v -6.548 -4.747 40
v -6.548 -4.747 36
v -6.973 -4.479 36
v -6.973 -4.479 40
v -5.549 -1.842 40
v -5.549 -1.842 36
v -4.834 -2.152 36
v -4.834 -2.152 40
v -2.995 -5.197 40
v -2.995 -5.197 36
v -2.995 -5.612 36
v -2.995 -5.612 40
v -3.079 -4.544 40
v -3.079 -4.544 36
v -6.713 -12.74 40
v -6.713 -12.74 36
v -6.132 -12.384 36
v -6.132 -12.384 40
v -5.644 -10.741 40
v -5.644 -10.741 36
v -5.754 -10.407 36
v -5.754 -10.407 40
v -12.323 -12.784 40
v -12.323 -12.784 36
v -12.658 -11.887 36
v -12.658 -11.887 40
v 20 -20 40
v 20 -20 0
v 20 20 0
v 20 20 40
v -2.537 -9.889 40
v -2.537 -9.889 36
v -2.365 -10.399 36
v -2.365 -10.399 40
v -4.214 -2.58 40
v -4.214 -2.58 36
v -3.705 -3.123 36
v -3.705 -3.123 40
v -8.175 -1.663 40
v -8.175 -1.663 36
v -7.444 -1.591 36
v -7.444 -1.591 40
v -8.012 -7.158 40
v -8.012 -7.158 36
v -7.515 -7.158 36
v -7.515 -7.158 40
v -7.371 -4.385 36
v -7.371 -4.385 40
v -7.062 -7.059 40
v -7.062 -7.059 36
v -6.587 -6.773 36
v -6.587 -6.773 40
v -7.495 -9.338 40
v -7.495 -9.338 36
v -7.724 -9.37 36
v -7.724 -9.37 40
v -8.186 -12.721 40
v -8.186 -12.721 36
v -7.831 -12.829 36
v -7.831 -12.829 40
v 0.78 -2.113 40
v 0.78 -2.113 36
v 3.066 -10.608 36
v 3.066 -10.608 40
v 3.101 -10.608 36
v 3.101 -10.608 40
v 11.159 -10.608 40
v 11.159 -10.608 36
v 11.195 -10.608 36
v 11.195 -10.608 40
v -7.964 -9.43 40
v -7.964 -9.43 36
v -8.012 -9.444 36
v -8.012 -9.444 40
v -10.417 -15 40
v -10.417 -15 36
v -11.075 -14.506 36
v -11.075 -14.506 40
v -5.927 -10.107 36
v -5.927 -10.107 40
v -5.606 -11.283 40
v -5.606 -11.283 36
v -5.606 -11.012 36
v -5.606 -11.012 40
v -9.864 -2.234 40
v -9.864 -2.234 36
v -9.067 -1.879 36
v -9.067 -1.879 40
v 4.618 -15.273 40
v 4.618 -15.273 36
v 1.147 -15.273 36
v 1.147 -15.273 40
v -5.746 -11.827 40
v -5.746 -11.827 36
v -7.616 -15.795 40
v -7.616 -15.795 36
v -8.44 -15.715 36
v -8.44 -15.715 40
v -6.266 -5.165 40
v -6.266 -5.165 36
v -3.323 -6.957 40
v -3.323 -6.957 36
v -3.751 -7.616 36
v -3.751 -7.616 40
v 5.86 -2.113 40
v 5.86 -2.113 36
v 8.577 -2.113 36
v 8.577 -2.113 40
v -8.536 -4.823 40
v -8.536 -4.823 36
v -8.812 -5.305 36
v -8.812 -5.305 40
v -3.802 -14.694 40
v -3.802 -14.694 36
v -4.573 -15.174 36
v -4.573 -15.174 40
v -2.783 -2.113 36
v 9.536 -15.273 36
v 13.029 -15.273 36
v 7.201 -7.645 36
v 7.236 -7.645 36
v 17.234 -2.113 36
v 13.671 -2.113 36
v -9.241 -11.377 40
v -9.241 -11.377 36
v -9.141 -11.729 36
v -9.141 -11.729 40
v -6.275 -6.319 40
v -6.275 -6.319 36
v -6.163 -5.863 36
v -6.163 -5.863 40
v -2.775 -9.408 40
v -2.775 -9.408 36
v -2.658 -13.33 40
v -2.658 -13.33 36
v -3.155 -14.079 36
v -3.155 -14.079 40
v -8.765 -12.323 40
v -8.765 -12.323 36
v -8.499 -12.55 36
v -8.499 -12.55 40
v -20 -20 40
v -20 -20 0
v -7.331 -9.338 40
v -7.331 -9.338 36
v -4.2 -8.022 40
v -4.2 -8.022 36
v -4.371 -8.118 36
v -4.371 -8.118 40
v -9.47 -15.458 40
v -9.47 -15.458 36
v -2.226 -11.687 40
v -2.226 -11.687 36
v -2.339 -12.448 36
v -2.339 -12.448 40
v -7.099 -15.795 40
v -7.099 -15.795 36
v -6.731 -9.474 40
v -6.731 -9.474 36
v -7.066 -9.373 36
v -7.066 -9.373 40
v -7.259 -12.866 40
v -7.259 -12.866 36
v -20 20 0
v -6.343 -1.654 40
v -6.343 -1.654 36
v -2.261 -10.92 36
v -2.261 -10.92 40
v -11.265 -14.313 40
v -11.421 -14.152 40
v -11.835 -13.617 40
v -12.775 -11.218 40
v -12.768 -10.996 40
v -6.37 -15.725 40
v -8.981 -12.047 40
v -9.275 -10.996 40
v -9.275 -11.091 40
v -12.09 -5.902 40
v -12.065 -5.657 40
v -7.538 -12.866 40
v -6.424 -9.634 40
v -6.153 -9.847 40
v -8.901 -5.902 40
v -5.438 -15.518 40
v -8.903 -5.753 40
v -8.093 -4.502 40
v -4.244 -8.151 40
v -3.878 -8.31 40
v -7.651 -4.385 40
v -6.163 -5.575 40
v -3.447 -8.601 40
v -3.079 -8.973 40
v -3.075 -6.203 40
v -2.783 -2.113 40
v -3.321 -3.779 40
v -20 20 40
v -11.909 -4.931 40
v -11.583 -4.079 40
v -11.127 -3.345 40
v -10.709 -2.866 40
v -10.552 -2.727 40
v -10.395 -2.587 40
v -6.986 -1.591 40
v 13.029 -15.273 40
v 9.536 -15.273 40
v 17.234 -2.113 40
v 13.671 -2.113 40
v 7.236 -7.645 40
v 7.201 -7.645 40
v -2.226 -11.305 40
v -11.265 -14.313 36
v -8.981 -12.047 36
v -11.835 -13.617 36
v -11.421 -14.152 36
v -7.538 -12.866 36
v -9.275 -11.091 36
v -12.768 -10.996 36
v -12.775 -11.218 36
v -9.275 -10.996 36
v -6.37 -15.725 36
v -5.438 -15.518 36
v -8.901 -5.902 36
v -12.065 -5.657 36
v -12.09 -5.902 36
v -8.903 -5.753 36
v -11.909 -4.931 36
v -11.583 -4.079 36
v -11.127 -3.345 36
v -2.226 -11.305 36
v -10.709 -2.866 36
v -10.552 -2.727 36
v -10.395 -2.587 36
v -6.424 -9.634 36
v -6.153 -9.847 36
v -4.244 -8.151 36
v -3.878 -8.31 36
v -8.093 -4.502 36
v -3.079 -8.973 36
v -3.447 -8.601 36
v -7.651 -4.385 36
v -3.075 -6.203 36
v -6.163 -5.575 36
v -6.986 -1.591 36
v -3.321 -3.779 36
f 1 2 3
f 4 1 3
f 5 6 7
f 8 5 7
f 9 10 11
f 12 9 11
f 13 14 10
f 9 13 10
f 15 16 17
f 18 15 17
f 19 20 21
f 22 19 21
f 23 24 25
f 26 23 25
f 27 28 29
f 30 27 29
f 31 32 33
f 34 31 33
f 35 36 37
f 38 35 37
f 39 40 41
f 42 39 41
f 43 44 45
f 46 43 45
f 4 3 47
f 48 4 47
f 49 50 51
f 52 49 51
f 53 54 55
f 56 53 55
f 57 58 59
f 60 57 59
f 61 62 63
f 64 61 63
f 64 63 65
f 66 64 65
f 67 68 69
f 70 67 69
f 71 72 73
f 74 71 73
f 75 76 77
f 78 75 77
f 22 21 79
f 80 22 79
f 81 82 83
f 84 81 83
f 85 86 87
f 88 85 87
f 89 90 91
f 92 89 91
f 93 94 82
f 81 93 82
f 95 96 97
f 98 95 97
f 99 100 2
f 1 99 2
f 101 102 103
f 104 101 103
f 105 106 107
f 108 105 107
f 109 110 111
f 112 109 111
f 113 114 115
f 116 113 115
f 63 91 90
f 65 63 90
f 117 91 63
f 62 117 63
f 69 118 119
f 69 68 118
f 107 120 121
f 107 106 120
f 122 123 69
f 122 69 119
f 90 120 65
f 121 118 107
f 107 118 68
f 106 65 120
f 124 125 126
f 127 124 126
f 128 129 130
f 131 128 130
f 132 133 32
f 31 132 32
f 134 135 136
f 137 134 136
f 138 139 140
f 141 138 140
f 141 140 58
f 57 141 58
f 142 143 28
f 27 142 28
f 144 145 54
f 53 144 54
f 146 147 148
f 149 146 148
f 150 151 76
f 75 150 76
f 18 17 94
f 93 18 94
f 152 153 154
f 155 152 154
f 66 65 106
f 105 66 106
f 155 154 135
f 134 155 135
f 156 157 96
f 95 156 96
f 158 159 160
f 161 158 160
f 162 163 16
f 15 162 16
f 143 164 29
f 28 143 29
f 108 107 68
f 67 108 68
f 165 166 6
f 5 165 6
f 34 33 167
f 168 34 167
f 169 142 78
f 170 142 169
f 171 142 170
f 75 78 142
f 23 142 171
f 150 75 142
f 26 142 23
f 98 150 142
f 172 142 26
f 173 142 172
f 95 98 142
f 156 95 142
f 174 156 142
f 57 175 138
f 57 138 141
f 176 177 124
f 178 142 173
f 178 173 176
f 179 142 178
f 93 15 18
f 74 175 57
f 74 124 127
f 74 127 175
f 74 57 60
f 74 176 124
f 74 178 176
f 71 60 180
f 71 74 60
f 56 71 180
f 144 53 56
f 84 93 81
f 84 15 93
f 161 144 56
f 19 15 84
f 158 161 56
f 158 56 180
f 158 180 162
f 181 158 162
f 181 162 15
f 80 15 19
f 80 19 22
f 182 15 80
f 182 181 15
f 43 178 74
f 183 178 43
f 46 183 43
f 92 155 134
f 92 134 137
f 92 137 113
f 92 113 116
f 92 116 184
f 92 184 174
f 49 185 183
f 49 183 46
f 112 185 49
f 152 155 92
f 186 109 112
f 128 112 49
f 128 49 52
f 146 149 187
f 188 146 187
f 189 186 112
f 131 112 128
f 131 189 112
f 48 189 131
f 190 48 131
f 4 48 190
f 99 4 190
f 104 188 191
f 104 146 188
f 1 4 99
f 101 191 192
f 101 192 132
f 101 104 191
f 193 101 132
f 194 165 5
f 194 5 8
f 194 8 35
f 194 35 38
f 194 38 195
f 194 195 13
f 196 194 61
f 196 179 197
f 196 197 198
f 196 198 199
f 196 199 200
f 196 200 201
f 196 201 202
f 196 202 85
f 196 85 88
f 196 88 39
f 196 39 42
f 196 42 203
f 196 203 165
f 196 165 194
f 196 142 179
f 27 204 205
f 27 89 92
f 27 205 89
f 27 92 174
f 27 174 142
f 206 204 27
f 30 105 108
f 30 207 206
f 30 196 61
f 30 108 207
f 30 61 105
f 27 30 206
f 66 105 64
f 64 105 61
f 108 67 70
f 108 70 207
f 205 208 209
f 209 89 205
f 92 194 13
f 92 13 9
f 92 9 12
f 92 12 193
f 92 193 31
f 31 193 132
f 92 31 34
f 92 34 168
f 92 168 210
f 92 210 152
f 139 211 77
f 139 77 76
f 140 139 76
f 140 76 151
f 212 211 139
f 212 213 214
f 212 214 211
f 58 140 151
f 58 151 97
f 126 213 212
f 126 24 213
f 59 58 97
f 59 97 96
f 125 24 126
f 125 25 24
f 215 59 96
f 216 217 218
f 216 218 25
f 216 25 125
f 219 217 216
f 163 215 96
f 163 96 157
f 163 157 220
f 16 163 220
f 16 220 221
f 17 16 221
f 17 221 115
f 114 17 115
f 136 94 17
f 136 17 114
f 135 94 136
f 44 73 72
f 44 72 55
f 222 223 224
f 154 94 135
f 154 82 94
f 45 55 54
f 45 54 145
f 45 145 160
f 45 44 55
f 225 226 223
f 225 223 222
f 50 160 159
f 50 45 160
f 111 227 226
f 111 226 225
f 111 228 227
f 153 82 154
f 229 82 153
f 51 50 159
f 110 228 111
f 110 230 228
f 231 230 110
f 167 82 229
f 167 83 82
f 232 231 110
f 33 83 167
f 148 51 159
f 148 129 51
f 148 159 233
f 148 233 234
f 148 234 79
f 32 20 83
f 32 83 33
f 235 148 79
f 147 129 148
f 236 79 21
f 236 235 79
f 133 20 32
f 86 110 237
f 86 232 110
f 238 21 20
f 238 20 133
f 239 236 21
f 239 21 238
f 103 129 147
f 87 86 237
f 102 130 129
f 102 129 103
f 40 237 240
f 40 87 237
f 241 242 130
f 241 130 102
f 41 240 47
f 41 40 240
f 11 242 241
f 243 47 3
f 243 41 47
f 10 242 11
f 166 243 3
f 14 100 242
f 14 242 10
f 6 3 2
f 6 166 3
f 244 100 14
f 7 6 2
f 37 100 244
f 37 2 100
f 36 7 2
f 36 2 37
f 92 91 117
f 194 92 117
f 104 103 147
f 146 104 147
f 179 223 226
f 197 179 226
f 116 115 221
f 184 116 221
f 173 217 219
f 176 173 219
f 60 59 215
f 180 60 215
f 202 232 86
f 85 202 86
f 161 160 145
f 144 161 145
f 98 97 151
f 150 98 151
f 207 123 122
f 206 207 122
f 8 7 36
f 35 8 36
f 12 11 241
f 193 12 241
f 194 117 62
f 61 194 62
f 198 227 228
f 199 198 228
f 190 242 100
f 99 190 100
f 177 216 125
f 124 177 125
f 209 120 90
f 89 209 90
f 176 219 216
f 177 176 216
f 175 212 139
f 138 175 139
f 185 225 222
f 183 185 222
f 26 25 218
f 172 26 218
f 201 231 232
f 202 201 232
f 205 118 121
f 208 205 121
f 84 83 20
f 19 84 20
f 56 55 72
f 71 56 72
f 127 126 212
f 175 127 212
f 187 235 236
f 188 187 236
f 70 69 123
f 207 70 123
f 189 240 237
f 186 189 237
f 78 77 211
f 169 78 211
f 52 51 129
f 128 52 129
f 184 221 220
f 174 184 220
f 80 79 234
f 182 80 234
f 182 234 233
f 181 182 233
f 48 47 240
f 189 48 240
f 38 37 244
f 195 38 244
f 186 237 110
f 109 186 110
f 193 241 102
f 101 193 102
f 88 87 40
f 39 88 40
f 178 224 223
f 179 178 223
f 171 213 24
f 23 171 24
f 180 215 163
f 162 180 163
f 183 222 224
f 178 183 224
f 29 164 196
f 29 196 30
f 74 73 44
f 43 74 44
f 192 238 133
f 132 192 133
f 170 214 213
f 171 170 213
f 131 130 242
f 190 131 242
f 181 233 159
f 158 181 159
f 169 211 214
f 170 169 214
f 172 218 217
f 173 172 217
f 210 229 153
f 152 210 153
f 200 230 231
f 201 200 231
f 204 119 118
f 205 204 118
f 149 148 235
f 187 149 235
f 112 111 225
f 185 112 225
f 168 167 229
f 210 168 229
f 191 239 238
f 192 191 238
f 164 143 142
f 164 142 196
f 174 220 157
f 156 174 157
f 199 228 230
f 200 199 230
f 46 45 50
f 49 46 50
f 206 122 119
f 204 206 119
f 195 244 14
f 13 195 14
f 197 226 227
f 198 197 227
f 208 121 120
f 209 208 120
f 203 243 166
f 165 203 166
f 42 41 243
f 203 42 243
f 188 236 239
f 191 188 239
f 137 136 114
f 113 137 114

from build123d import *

# Parameters (mm, degrees)
F1_DEPTH = 36
F0_W     = 40
F0_H     = 40
F2_DEPTH = 40


with BuildPart() as f1:
    # F0 (on Top) → F1 (new body)
    with BuildSketch(Plane.XY):
        Polygon((3.101004, -10.608389), (3.065746, -10.608389), (0.779772, -2.113194), (-2.783486, -2.113194), (1.146619, -15.272514), (4.618077, -15.272514), (7.200689, -7.644909), (7.235946, -7.644909), (9.536348, -15.272514), (13.029041, -15.272514), (17.234143, -2.113194), (13.670884, -2.113194), (11.194501, -10.608389), (11.159193, -10.608389), (8.576581, -2.113194), (5.860053, -2.113194), align=None)
        Polygon((-12.065109, -5.657147), (-12.090155, -5.902169), (-8.900907, -5.902169), (-8.903396, -5.753063), (-8.811646, -5.30488), (-8.53599, -4.823371), (-8.093396, -4.501942), (-7.651259, -4.385146), (-7.503778, -4.385146), (-7.371285, -4.385146), (-6.97294, -4.479131), (-6.547974, -4.746761), (-6.265765, -5.164868), (-6.163143, -5.574948), (-6.163143, -5.711709), (-6.163143, -5.863254), (-6.275062, -6.31865), (-6.586788, -6.773437), (-7.062302, -7.058949), (-7.515362, -7.158167), (-7.666144, -7.158167), (-8.012111, -7.158167), (-8.012111, -9.444141), (-7.964408, -9.430119), (-7.723501, -9.370071), (-7.495244, -9.338319), (-7.419192, -9.338319), (-7.330998, -9.338319), (-7.065807, -9.373119), (-6.73122, -9.473962), (-6.423914, -9.634093), (-6.152983, -9.847109), (-5.926707, -10.107067), (-5.754384, -10.406956), (-5.644446, -10.74068), (-5.605887, -11.011916), (-5.605887, -11.102294), (-5.605887, -11.283457), (-5.745849, -11.82725), (-6.131747, -12.383744), (-6.713287, -12.740329), (-7.258807, -12.86632), (-7.440427, -12.86632), (-7.538274, -12.86632), (-7.831253, -12.828523), (-8.185654, -12.720821), (-8.498548, -12.54992), (-8.765314, -12.322781), (-8.981175, -12.046871), (-9.141255, -11.729099), (-9.240828, -11.376578), (-9.274968, -11.091321), (-9.274968, -10.996472), (-12.767661, -10.996472), (-12.77457, -11.21782), (-12.657927, -11.886791), (-12.32334, -12.784172), (-11.834921, -13.61683), (-11.421234, -14.152088), (-11.26466, -14.312778), (-11.075064, -14.506286), (-10.416608, -14.999647), (-9.469847, -15.458285), (-8.43982, -15.714615), (-7.616256, -15.794543), (-7.341768, -15.794543), (-7.098931, -15.794543), (-6.370469, -15.725091), (-5.438289, -15.517825), (-4.572812, -15.173845), (-3.802438, -14.693697), (-3.154753, -14.07878), (-2.657546, -13.329642), (-2.338606, -12.447959), (-2.22623, -11.687441), (-2.22623, -11.43424), (-2.22623, -11.305454), (-2.261233, -10.919658), (-2.365074, -10.39898), (-2.536534, -9.889326), (-2.774951, -9.408122), (-3.078701, -8.972894), (-3.446615, -8.601068), (-3.878033, -8.310273), (-4.244016, -8.151209), (-4.371074, -8.117934), (-4.199614, -8.021967), (-3.751483, -7.615951), (-3.323418, -6.956937), (-3.075399, -6.202566), (-2.995181, -5.612237), (-2.995181, -5.415427), (-2.995181, -5.197382), (-3.079209, -4.543905), (-3.320929, -3.778713), (-3.704643, -3.123001), (-4.214246, -2.579513), (-4.834396, -2.151753), (-5.549344, -1.842212), (-6.343442, -1.654241), (-6.986453, -1.591195), (-7.200638, -1.591195), (-7.444288, -1.591195), (-8.174934, -1.663335), (-9.066879, -1.878637), (-9.863975, -2.233901), (-10.395068, -2.586981), (-10.552252, -2.726993), (-10.709029, -2.866447), (-11.126883, -3.344908), (-11.583295, -4.078907), (-11.908535, -4.930616), align=None)
    extrude(amount=F1_DEPTH)

    # F0 (on Top) → F2 (join)
    with BuildSketch(Plane.XY):
        Rectangle(F0_W, F0_H)
        Polygon((-8.900907, -5.902169), (-12.090155, -5.902169), (-12.065109, -5.657147), (-11.908535, -4.930616), (-11.583295, -4.078907), (-11.126883, -3.344908), (-10.709029, -2.866447), (-10.552252, -2.726993), (-10.395068, -2.586981), (-9.863975, -2.233901), (-9.066879, -1.878637), (-8.174934, -1.663335), (-7.444288, -1.591195), (-7.200638, -1.591195), (-6.986453, -1.591195), (-6.343442, -1.654241), (-5.549344, -1.842212), (-4.834396, -2.151753), (-4.214246, -2.579513), (-3.704643, -3.123001), (-3.320929, -3.778713), (-3.079209, -4.543905), (-2.995181, -5.197382), (-2.995181, -5.415427), (-2.995181, -5.612237), (-3.075399, -6.202566), (-3.323418, -6.956937), (-3.751483, -7.615951), (-4.199614, -8.021967), (-4.371074, -8.117934), (-4.244016, -8.151209), (-3.878033, -8.310273), (-3.446615, -8.601068), (-3.078701, -8.972894), (-2.774951, -9.408122), (-2.536534, -9.889326), (-2.365074, -10.39898), (-2.261233, -10.919658), (-2.22623, -11.305454), (-2.22623, -11.43424), (-2.22623, -11.687441), (-2.338606, -12.447959), (-2.657546, -13.329642), (-3.154753, -14.07878), (-3.802438, -14.693697), (-4.572812, -15.173845), (-5.438289, -15.517825), (-6.370469, -15.725091), (-7.098931, -15.794543), (-7.341768, -15.794543), (-7.616256, -15.794543), (-8.43982, -15.714615), (-9.469847, -15.458285), (-10.416608, -14.999647), (-11.075064, -14.506286), (-11.26466, -14.312778), (-11.421234, -14.152088), (-11.834921, -13.61683), (-12.32334, -12.784172), (-12.657927, -11.886791), (-12.77457, -11.21782), (-12.767661, -10.996472), (-9.274968, -10.996472), (-9.274968, -11.091321), (-9.240828, -11.376578), (-9.141255, -11.729099), (-8.981175, -12.046871), (-8.765314, -12.322781), (-8.498548, -12.54992), (-8.185654, -12.720821), (-7.831253, -12.828523), (-7.538274, -12.86632), (-7.440427, -12.86632), (-7.258807, -12.86632), (-6.713287, -12.740329), (-6.131747, -12.383744), (-5.745849, -11.82725), (-5.605887, -11.283457), (-5.605887, -11.102294), (-5.605887, -11.011916), (-5.644446, -10.74068), (-5.754384, -10.406956), (-5.926707, -10.107067), (-6.152983, -9.847109), (-6.423914, -9.634093), (-6.73122, -9.473962), (-7.065807, -9.373119), (-7.330998, -9.338319), (-7.419192, -9.338319), (-7.495244, -9.338319), (-7.723501, -9.370071), (-7.964408, -9.430119), (-8.012111, -9.444141), (-8.012111, -7.158167), (-7.666144, -7.158167), (-7.515362, -7.158167), (-7.062302, -7.058949), (-6.586788, -6.773437), (-6.275062, -6.31865), (-6.163143, -5.863254), (-6.163143, -5.711709), (-6.163143, -5.574948), (-6.265765, -5.164868), (-6.547974, -4.746761), (-6.97294, -4.479131), (-7.371285, -4.385146), (-7.503778, -4.385146), (-7.651259, -4.385146), (-8.093396, -4.501942), (-8.53599, -4.823371), (-8.811646, -5.30488), (-8.903396, -5.753063), align=None, mode=Mode.SUBTRACT)
        Polygon((0.779772, -2.113194), (3.065746, -10.608389), (3.101004, -10.608389), (5.860053, -2.113194), (8.576581, -2.113194), (11.159193, -10.608389), (11.194501, -10.608389), (13.670884, -2.113194), (17.234143, -2.113194), (13.029041, -15.272514), (9.536348, -15.272514), (7.235946, -7.644909), (7.200689, -7.644909), (4.618077, -15.272514), (1.146619, -15.272514), (-2.783486, -2.113194), align=None, mode=Mode.SUBTRACT)
    extrude(amount=F2_DEPTH)


solid = f1.part
